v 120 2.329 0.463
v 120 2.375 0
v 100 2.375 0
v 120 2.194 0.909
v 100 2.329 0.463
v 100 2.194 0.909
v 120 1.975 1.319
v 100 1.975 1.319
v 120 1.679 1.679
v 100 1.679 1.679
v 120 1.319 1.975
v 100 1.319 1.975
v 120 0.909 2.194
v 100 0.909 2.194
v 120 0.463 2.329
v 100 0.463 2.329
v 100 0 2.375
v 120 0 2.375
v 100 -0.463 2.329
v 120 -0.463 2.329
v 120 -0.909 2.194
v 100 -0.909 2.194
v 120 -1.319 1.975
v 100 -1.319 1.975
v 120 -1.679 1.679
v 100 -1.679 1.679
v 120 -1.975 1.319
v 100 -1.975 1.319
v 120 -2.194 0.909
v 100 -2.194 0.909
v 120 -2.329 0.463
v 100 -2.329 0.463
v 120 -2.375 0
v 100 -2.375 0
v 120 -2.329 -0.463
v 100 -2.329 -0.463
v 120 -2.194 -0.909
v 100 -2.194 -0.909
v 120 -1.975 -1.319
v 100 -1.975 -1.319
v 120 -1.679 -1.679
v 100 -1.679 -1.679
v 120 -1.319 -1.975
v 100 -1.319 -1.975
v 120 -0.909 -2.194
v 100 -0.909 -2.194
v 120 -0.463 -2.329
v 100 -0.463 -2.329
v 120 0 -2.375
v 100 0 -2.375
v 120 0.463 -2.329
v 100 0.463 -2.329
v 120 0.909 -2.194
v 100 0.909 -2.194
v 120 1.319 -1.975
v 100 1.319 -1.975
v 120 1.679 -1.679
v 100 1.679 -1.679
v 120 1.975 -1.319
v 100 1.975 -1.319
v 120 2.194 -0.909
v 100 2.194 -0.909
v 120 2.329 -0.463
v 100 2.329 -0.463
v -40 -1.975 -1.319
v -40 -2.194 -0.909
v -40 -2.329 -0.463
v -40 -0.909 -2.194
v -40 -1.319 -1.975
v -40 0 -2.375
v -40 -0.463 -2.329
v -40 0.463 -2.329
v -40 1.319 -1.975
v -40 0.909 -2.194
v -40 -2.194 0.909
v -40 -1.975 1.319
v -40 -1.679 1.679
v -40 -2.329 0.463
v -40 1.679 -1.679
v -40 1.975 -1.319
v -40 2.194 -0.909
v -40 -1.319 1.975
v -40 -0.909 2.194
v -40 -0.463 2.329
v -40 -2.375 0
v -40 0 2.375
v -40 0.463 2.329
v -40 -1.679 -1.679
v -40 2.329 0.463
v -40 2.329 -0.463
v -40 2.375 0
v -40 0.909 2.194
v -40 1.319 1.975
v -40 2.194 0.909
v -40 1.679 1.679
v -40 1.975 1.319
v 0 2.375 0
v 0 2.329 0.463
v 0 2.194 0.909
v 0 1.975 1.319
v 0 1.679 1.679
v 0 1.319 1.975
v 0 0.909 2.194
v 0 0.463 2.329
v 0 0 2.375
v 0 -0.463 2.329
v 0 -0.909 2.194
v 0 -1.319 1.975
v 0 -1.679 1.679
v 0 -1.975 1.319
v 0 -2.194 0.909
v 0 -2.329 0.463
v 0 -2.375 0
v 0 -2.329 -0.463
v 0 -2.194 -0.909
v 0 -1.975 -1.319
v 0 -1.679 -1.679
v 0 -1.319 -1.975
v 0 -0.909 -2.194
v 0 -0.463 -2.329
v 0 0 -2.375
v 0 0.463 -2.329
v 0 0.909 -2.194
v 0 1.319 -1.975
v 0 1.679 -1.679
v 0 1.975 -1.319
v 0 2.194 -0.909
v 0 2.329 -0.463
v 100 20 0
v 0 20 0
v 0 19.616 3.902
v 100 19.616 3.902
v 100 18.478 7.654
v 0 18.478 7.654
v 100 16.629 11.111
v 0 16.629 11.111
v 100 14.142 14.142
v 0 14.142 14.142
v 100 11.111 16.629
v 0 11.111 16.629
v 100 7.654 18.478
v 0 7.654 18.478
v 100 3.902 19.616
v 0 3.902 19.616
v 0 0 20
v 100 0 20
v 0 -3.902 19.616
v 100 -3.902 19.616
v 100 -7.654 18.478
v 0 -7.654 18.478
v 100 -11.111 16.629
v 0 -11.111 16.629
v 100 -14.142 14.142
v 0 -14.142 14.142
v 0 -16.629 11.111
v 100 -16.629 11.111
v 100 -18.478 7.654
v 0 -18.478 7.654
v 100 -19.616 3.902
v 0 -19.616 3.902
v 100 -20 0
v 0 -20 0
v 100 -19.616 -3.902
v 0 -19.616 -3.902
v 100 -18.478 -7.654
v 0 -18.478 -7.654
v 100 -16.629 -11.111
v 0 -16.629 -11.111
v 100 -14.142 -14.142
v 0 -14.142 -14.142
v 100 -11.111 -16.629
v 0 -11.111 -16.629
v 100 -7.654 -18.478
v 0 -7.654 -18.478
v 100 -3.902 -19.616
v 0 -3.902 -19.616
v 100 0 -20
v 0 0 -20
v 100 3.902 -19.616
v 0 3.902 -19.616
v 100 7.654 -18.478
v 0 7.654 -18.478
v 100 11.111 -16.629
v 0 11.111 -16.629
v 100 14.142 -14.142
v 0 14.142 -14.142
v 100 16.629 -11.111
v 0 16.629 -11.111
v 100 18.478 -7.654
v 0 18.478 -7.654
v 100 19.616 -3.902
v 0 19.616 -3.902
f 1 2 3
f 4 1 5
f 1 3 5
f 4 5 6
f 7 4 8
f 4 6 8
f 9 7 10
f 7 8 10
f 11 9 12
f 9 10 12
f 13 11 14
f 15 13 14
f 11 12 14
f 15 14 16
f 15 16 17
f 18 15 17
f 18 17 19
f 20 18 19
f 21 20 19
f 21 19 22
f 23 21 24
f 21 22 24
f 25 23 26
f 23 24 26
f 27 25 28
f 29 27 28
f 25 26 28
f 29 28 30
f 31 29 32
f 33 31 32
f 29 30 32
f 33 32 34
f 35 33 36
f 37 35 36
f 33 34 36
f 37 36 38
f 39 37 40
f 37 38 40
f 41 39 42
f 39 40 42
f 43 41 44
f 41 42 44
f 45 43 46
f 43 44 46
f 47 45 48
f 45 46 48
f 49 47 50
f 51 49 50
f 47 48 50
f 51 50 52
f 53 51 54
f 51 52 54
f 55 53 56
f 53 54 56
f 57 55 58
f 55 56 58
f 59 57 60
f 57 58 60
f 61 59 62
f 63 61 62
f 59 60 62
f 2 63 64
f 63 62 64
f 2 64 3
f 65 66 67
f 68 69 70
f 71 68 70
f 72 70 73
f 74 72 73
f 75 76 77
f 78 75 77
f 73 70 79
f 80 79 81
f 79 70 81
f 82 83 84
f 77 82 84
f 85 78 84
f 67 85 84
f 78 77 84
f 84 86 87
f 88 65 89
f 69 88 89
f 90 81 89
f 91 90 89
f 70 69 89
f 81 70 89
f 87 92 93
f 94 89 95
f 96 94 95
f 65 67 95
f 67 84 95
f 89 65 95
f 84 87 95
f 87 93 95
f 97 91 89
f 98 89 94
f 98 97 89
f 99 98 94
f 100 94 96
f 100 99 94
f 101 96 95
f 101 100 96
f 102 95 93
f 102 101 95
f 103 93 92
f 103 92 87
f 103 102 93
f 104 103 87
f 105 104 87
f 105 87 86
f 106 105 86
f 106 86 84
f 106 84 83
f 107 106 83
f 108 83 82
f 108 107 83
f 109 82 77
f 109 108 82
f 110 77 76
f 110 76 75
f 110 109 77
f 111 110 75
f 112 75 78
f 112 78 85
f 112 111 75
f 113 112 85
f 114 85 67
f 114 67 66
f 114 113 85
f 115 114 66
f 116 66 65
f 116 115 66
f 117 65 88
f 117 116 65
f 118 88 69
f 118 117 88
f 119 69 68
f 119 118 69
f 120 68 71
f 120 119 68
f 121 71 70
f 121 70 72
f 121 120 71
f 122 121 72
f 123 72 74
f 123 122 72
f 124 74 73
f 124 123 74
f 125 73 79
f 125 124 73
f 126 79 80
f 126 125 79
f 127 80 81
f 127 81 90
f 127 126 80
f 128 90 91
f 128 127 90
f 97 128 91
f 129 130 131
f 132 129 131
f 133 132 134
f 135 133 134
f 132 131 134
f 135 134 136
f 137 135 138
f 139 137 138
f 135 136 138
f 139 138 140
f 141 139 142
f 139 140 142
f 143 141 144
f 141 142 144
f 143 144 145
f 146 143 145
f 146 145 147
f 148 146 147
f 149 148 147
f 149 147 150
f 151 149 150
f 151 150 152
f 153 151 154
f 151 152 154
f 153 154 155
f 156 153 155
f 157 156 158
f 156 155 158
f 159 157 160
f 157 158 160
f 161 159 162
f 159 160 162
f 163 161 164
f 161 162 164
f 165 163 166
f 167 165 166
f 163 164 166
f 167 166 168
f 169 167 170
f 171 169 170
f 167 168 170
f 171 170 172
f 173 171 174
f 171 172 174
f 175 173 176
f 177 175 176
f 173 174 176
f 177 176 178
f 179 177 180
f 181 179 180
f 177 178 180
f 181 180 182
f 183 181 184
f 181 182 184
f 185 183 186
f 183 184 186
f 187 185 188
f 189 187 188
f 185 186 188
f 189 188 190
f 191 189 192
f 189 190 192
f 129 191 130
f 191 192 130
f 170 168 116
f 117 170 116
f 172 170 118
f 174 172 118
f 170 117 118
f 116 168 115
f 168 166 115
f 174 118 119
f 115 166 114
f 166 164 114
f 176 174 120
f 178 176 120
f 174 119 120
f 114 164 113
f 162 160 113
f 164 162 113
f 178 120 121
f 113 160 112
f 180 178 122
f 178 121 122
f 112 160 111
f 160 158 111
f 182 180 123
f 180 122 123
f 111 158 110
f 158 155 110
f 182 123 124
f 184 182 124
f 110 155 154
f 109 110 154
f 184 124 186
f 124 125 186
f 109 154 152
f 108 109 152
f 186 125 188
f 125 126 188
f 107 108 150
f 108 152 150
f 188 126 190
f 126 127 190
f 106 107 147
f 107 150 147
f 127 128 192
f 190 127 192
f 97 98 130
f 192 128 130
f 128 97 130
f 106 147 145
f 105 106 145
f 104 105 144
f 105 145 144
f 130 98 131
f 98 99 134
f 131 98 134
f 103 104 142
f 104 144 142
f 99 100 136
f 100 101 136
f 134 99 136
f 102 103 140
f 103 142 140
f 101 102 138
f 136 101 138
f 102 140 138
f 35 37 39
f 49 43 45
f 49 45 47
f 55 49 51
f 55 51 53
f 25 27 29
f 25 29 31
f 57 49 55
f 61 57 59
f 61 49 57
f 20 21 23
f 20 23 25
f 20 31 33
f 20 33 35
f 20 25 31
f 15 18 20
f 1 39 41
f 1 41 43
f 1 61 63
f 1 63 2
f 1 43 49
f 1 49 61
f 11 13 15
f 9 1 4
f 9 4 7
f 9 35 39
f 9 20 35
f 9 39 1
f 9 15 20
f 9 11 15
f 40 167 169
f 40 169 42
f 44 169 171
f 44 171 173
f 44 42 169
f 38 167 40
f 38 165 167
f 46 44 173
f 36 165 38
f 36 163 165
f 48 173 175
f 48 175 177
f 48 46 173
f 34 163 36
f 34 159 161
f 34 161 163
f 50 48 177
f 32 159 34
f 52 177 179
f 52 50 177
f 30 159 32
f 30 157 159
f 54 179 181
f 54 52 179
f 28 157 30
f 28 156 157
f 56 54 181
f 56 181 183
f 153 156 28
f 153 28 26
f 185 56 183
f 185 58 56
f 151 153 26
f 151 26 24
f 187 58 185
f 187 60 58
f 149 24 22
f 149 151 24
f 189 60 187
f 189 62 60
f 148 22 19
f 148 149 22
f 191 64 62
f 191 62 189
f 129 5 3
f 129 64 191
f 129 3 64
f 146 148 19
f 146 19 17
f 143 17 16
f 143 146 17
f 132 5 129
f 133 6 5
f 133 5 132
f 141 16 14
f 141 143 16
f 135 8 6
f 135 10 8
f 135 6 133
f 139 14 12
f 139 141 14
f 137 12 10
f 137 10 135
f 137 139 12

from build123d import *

# Parameters (mm, degrees)
F0_R     = 20
F1_DEPTH = 100
F2_R     = 2.375
F3_DEPTH = 20
F4_R     = 2.375
F5_DEPTH = 40


with BuildPart() as f1:
    # F0 (on Right) → F1 (new body)
    with BuildSketch(Plane.YZ):
        Circle(F0_R)
    extrude(amount=F1_DEPTH)

    # F2 (on face) → F3 (join)
    with BuildSketch(Plane.YZ.offset(100)):
        Circle(F2_R)
    extrude(amount=F3_DEPTH)

    # F4 (on face) → F5 (join)
    with BuildSketch(Plane.YZ):
        Circle(F4_R)
    extrude(amount=-F5_DEPTH)


solid = f1.part
